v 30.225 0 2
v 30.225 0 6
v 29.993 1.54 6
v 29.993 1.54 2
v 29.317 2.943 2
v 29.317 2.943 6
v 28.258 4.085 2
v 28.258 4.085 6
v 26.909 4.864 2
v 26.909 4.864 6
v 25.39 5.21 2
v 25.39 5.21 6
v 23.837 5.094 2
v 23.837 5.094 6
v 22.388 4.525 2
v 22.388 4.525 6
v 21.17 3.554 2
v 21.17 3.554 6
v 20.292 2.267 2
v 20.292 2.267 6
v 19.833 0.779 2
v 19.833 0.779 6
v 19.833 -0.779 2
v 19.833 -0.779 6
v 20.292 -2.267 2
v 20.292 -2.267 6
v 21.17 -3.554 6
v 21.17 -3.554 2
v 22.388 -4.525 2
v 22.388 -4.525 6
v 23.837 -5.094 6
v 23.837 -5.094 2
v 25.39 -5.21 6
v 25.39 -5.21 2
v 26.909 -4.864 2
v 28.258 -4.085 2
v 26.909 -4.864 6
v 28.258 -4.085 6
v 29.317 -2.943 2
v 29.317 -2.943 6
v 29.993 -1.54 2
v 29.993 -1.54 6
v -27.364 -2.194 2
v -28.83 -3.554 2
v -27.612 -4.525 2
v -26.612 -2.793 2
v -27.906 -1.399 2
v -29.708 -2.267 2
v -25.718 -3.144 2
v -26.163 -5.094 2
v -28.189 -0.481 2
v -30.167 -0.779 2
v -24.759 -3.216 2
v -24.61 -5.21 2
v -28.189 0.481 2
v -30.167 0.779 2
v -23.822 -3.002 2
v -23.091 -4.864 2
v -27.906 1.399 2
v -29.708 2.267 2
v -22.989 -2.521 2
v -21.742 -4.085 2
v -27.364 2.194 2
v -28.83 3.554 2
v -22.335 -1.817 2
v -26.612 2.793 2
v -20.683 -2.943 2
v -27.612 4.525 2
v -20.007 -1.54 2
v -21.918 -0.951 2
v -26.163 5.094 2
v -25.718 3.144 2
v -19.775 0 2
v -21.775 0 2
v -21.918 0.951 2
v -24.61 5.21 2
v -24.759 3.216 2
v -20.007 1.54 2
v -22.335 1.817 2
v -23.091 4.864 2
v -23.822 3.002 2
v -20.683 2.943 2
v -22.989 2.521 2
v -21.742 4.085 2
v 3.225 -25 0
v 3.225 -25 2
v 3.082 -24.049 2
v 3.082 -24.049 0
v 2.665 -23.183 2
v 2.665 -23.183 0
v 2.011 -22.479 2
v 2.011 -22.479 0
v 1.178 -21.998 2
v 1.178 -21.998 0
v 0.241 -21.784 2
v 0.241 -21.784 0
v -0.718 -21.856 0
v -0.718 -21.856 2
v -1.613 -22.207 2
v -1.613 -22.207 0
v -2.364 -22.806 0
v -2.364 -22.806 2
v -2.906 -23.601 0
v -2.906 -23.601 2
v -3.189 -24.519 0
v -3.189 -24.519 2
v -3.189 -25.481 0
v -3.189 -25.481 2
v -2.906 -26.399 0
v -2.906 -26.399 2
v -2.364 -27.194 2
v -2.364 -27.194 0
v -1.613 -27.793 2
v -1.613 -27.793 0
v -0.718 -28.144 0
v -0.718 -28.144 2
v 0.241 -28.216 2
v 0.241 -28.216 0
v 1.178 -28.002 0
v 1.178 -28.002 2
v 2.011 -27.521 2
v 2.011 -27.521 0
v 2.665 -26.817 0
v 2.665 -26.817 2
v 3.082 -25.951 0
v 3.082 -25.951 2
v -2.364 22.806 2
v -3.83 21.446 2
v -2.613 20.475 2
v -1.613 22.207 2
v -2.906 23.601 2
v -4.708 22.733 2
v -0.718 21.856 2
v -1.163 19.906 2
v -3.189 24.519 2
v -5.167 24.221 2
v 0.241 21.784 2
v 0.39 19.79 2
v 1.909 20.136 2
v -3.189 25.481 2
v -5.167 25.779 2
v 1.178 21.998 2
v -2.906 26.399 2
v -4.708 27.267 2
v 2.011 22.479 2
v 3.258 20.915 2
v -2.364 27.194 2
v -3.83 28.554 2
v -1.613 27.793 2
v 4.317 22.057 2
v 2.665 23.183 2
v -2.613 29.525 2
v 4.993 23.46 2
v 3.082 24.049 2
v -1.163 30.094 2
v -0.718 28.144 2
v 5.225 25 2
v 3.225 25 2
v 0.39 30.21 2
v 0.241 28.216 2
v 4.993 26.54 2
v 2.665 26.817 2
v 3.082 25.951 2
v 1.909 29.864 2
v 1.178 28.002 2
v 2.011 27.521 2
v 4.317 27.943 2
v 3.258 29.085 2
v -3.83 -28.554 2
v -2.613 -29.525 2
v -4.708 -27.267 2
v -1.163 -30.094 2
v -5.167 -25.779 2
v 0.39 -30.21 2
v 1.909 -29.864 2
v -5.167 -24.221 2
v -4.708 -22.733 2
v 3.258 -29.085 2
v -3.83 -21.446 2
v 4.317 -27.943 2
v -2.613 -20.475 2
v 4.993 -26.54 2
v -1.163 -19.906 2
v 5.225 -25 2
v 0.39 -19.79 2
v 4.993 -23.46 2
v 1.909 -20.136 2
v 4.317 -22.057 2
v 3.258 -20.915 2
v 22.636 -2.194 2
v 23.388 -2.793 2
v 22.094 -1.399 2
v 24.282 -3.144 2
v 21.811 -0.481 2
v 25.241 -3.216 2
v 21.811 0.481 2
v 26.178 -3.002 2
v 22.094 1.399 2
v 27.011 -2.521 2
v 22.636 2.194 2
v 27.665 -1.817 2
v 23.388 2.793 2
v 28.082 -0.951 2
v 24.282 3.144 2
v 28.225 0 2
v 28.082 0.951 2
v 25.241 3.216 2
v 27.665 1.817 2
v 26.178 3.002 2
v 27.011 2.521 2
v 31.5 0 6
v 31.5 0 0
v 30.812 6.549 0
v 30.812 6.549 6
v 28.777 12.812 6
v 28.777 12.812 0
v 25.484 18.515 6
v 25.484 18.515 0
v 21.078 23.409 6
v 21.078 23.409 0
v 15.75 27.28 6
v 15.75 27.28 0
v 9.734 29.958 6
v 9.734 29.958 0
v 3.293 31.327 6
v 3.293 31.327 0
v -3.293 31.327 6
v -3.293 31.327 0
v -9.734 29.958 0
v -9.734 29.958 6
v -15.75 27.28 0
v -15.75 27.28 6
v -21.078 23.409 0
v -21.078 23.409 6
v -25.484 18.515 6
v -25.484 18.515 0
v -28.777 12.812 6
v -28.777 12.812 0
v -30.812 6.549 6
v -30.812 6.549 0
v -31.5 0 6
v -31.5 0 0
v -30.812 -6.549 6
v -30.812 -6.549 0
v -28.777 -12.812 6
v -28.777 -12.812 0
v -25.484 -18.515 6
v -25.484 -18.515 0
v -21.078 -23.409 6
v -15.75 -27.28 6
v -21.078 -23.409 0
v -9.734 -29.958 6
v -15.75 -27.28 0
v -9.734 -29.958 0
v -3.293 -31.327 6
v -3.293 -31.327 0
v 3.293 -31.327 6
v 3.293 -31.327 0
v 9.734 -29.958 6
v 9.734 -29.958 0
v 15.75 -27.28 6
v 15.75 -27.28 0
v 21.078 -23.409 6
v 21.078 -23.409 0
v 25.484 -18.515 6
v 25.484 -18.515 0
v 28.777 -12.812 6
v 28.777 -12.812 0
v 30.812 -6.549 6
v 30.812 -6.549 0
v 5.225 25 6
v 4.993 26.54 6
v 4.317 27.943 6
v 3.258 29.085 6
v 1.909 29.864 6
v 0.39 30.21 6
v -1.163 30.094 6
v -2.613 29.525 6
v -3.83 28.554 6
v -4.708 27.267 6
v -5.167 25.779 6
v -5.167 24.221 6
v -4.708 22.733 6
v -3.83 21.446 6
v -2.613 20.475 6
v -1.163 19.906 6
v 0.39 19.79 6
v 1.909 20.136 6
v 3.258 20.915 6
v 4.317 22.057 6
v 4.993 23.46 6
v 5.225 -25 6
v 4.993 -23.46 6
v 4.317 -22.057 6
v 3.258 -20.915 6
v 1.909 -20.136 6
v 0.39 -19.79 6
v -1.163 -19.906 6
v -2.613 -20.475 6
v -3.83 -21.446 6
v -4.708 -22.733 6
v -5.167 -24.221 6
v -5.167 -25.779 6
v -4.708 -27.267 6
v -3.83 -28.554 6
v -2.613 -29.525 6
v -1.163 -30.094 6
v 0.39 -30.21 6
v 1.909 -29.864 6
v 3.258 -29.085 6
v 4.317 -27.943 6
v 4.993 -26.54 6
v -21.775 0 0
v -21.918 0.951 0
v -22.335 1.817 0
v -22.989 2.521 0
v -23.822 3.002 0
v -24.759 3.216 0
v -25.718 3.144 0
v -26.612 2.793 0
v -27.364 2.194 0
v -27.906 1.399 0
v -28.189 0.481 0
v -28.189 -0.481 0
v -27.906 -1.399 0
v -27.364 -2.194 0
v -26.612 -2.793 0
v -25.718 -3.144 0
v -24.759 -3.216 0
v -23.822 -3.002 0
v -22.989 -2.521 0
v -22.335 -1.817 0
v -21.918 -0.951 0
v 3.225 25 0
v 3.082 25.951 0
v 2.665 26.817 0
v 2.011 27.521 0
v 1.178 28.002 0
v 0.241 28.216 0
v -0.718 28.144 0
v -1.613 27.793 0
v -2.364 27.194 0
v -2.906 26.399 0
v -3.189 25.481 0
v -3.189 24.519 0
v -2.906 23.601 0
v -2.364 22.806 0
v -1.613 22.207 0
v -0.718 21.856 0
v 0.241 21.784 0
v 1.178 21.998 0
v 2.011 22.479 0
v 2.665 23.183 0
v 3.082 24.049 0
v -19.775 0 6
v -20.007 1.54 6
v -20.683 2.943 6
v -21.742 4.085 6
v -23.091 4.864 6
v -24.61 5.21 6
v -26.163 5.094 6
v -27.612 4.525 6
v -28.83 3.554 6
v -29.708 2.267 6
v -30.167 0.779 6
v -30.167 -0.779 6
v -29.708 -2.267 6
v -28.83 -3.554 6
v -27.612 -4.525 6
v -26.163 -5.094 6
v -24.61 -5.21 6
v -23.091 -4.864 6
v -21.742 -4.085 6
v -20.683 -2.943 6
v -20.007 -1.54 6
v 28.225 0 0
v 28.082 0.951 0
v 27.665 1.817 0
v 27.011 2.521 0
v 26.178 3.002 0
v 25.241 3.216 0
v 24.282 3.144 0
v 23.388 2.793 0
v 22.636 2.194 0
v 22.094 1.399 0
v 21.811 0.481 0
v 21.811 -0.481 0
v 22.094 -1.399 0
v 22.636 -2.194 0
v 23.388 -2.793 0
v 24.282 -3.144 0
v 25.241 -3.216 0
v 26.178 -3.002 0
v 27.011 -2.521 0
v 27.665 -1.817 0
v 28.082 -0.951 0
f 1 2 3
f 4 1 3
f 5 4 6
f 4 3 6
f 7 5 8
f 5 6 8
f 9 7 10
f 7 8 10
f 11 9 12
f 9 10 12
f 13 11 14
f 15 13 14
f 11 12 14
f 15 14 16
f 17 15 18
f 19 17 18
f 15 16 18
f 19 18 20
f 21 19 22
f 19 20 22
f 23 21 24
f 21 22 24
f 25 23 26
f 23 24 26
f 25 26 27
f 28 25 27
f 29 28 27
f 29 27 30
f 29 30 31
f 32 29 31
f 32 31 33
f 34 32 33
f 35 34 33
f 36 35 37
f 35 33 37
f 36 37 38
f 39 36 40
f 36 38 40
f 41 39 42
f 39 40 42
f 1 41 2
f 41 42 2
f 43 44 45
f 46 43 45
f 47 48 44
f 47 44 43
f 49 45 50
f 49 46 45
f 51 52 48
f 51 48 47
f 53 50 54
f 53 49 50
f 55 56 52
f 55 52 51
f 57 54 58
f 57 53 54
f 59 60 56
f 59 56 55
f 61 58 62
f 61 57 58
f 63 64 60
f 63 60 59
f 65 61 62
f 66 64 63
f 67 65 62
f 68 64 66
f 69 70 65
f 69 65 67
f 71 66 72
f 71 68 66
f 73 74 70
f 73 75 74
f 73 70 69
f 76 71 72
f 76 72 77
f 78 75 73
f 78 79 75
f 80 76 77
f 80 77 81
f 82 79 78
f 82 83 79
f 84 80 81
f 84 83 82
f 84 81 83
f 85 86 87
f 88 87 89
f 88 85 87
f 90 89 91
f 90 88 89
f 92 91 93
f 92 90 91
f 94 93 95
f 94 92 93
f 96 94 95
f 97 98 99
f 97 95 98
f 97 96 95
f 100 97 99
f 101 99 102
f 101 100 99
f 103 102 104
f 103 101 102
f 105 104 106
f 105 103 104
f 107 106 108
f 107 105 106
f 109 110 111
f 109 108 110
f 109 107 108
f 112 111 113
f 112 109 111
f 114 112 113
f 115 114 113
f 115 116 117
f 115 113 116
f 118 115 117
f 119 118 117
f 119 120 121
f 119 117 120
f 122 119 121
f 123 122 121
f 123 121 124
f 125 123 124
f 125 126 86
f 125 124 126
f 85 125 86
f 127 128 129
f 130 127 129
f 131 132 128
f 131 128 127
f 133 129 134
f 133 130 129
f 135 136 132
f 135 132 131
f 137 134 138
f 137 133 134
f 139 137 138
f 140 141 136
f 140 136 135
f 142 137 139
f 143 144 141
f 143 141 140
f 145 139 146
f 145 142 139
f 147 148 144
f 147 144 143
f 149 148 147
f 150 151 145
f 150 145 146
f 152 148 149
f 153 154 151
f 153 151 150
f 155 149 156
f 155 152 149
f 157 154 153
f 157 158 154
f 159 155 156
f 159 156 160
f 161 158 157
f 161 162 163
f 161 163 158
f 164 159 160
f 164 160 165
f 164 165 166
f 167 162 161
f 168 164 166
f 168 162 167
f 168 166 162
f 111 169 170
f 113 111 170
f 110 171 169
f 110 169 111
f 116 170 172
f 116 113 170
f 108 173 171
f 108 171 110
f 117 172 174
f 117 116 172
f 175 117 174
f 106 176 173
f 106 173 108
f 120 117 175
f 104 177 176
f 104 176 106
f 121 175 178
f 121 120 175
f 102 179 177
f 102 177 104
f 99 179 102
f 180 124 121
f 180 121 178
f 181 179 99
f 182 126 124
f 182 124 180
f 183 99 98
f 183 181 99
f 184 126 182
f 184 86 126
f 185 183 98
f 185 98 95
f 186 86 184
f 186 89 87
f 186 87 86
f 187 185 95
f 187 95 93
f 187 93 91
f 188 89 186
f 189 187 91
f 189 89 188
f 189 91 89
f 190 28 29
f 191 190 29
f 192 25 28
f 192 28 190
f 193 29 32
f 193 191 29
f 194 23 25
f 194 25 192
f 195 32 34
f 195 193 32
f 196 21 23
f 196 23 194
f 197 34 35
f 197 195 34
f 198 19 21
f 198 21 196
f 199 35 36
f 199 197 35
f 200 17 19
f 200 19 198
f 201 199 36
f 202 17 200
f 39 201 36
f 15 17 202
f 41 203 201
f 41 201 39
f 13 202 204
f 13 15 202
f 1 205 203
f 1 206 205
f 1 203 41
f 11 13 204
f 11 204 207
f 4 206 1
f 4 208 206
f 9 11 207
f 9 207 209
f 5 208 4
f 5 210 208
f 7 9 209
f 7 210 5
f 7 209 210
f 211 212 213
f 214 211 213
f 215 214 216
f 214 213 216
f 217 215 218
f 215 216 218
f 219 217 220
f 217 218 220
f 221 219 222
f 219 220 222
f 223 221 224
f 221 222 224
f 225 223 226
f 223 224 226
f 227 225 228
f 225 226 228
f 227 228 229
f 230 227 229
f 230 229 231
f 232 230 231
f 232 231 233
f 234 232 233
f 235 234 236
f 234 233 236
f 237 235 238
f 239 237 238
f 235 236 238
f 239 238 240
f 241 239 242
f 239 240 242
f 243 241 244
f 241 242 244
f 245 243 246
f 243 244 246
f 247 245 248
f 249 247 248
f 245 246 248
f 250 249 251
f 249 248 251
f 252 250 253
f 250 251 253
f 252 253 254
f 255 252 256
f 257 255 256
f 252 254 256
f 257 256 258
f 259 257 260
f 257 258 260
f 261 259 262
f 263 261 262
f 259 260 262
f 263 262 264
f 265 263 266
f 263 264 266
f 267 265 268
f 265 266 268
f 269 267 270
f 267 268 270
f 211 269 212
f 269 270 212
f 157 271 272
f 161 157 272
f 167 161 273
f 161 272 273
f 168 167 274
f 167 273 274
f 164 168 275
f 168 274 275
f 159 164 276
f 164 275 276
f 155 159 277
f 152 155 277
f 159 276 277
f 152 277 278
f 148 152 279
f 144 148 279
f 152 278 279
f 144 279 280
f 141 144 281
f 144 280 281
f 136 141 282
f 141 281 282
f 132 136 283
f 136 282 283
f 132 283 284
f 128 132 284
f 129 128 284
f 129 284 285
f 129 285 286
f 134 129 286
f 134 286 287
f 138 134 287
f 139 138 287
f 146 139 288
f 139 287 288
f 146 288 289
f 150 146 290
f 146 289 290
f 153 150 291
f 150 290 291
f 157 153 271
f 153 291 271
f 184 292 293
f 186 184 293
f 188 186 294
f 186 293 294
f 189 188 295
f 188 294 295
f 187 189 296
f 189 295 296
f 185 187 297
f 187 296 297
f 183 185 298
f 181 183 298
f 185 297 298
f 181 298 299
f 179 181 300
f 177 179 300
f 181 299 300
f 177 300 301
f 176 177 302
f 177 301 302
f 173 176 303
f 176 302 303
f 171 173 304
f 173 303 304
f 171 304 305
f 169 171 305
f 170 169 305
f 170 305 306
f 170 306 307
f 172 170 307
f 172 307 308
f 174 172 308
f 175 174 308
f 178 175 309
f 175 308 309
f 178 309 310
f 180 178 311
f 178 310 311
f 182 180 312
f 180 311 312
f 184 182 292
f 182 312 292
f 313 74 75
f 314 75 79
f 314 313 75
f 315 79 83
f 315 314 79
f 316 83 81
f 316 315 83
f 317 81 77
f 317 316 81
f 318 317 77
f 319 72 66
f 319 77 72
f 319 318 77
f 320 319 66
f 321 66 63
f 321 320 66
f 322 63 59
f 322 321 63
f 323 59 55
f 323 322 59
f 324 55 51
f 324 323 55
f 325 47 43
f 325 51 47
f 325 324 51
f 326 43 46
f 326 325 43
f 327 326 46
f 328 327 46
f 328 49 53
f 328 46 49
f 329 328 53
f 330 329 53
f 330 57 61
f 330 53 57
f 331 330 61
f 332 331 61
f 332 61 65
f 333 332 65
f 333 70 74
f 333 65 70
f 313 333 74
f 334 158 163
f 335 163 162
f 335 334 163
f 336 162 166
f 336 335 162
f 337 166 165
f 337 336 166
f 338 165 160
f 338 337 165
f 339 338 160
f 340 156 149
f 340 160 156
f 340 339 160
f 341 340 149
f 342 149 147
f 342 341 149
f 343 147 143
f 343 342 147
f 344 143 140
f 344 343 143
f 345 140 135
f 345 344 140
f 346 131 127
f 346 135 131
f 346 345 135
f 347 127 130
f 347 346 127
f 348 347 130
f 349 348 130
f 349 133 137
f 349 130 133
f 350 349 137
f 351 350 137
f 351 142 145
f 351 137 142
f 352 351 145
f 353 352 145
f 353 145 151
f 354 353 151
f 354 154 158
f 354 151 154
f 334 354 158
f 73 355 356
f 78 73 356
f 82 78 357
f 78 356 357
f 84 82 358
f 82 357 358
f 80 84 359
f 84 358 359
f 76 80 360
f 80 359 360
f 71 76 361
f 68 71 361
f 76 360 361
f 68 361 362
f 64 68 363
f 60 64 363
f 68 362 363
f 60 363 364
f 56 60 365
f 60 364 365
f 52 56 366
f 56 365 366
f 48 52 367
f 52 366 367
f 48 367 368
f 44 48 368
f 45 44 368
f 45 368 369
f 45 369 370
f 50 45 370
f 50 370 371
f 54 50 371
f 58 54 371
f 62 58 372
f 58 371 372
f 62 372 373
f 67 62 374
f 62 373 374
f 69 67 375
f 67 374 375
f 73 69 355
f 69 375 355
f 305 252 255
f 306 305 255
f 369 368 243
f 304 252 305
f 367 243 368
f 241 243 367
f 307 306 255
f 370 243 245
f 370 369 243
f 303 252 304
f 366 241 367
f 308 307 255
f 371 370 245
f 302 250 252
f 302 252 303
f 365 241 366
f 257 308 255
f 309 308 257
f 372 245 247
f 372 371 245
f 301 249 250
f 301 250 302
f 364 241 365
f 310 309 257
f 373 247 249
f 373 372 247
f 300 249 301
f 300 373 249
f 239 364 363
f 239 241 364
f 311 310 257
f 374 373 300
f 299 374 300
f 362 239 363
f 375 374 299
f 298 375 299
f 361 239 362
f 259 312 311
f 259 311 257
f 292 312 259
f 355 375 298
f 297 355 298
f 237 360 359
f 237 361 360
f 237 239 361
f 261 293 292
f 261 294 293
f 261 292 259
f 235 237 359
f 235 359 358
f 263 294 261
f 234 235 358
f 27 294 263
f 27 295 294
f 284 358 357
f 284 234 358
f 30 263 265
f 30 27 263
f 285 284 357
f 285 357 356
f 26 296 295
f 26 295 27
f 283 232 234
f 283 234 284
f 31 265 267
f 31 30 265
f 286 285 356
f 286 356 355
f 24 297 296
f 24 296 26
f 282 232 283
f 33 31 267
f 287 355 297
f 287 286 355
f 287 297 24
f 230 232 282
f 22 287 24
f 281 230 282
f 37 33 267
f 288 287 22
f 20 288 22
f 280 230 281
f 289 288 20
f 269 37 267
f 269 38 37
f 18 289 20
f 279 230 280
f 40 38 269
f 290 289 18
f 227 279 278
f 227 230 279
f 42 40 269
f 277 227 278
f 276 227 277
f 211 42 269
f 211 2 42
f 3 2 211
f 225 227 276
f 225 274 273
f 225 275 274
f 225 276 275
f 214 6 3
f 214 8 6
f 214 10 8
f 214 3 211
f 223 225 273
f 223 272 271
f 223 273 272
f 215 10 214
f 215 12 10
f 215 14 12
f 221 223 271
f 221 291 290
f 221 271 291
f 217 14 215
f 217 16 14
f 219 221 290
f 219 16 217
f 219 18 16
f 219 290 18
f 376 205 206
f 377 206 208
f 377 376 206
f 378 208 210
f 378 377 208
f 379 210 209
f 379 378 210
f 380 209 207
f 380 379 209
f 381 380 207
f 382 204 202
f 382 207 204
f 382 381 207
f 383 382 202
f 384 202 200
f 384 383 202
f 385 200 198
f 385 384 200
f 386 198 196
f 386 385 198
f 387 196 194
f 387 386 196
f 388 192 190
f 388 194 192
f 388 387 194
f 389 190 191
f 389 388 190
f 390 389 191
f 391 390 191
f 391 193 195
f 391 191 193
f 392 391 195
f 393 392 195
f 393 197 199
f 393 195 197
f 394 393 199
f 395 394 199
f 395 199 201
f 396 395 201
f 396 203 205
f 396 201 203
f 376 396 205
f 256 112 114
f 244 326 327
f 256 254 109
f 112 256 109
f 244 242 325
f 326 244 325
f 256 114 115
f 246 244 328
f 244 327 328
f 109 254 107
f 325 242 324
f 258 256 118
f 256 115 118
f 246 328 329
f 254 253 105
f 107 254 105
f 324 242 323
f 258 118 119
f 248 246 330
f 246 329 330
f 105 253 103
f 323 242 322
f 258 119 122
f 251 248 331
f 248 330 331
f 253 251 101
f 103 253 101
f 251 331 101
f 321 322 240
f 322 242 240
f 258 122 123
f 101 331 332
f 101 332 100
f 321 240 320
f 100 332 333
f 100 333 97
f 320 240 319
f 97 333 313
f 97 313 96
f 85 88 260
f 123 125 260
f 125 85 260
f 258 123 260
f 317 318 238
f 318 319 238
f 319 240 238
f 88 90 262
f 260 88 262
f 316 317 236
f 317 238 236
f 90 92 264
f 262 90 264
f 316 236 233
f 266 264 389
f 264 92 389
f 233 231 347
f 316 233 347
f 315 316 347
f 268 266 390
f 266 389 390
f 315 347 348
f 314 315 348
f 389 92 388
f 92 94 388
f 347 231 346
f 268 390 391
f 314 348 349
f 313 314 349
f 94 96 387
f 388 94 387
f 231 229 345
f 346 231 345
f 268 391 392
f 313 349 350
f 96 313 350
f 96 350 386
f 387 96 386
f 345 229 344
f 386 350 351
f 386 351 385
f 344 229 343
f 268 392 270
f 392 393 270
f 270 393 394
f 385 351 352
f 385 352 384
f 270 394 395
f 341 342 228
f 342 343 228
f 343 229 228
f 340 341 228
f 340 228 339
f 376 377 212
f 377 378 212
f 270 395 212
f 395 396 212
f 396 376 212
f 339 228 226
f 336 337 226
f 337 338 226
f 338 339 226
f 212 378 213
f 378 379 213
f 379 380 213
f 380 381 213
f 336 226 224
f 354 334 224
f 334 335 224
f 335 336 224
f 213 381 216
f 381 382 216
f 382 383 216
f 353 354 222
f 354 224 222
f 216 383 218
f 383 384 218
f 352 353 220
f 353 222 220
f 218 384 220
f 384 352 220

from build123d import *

# Parameters (mm, degrees)
SKETCH1_R              = 31.5
SKETCH1_R_2            = 3.225
MAIN_PA10_FLANGE_DEPTH = 6
SKETCH3_R              = 5.225
M6_HOLE_DEPTH          = 4


with BuildPart() as part:
    # Sketch1 → Main PA10 Flange (new body)
    with BuildSketch(Plane.XY):
        Circle(SKETCH1_R)
        with Locations((0, -25)):
            Circle(SKETCH1_R_2, mode=Mode.SUBTRACT)
        with Locations((-25, 0)):
            Circle(SKETCH1_R_2, mode=Mode.SUBTRACT)
        with Locations((0, 25)):
            Circle(SKETCH1_R_2, mode=Mode.SUBTRACT)
        with Locations((25, 0)):
            Circle(SKETCH1_R_2, mode=Mode.SUBTRACT)
    extrude(amount=MAIN_PA10_FLANGE_DEPTH)

    # Sketch3 → M6 Hole (cut)
    with BuildSketch(Plane.XY.offset(6)):
        with Locations((0, -25)):
            Circle(SKETCH3_R)
        with Locations((-25, 0)):
            Circle(SKETCH3_R)
        with Locations((0, 25)):
            Circle(SKETCH3_R)
        with Locations((25, 0)):
            Circle(SKETCH3_R)
    extrude(amount=-M6_HOLE_DEPTH, mode=Mode.SUBTRACT)


solid = part.part
